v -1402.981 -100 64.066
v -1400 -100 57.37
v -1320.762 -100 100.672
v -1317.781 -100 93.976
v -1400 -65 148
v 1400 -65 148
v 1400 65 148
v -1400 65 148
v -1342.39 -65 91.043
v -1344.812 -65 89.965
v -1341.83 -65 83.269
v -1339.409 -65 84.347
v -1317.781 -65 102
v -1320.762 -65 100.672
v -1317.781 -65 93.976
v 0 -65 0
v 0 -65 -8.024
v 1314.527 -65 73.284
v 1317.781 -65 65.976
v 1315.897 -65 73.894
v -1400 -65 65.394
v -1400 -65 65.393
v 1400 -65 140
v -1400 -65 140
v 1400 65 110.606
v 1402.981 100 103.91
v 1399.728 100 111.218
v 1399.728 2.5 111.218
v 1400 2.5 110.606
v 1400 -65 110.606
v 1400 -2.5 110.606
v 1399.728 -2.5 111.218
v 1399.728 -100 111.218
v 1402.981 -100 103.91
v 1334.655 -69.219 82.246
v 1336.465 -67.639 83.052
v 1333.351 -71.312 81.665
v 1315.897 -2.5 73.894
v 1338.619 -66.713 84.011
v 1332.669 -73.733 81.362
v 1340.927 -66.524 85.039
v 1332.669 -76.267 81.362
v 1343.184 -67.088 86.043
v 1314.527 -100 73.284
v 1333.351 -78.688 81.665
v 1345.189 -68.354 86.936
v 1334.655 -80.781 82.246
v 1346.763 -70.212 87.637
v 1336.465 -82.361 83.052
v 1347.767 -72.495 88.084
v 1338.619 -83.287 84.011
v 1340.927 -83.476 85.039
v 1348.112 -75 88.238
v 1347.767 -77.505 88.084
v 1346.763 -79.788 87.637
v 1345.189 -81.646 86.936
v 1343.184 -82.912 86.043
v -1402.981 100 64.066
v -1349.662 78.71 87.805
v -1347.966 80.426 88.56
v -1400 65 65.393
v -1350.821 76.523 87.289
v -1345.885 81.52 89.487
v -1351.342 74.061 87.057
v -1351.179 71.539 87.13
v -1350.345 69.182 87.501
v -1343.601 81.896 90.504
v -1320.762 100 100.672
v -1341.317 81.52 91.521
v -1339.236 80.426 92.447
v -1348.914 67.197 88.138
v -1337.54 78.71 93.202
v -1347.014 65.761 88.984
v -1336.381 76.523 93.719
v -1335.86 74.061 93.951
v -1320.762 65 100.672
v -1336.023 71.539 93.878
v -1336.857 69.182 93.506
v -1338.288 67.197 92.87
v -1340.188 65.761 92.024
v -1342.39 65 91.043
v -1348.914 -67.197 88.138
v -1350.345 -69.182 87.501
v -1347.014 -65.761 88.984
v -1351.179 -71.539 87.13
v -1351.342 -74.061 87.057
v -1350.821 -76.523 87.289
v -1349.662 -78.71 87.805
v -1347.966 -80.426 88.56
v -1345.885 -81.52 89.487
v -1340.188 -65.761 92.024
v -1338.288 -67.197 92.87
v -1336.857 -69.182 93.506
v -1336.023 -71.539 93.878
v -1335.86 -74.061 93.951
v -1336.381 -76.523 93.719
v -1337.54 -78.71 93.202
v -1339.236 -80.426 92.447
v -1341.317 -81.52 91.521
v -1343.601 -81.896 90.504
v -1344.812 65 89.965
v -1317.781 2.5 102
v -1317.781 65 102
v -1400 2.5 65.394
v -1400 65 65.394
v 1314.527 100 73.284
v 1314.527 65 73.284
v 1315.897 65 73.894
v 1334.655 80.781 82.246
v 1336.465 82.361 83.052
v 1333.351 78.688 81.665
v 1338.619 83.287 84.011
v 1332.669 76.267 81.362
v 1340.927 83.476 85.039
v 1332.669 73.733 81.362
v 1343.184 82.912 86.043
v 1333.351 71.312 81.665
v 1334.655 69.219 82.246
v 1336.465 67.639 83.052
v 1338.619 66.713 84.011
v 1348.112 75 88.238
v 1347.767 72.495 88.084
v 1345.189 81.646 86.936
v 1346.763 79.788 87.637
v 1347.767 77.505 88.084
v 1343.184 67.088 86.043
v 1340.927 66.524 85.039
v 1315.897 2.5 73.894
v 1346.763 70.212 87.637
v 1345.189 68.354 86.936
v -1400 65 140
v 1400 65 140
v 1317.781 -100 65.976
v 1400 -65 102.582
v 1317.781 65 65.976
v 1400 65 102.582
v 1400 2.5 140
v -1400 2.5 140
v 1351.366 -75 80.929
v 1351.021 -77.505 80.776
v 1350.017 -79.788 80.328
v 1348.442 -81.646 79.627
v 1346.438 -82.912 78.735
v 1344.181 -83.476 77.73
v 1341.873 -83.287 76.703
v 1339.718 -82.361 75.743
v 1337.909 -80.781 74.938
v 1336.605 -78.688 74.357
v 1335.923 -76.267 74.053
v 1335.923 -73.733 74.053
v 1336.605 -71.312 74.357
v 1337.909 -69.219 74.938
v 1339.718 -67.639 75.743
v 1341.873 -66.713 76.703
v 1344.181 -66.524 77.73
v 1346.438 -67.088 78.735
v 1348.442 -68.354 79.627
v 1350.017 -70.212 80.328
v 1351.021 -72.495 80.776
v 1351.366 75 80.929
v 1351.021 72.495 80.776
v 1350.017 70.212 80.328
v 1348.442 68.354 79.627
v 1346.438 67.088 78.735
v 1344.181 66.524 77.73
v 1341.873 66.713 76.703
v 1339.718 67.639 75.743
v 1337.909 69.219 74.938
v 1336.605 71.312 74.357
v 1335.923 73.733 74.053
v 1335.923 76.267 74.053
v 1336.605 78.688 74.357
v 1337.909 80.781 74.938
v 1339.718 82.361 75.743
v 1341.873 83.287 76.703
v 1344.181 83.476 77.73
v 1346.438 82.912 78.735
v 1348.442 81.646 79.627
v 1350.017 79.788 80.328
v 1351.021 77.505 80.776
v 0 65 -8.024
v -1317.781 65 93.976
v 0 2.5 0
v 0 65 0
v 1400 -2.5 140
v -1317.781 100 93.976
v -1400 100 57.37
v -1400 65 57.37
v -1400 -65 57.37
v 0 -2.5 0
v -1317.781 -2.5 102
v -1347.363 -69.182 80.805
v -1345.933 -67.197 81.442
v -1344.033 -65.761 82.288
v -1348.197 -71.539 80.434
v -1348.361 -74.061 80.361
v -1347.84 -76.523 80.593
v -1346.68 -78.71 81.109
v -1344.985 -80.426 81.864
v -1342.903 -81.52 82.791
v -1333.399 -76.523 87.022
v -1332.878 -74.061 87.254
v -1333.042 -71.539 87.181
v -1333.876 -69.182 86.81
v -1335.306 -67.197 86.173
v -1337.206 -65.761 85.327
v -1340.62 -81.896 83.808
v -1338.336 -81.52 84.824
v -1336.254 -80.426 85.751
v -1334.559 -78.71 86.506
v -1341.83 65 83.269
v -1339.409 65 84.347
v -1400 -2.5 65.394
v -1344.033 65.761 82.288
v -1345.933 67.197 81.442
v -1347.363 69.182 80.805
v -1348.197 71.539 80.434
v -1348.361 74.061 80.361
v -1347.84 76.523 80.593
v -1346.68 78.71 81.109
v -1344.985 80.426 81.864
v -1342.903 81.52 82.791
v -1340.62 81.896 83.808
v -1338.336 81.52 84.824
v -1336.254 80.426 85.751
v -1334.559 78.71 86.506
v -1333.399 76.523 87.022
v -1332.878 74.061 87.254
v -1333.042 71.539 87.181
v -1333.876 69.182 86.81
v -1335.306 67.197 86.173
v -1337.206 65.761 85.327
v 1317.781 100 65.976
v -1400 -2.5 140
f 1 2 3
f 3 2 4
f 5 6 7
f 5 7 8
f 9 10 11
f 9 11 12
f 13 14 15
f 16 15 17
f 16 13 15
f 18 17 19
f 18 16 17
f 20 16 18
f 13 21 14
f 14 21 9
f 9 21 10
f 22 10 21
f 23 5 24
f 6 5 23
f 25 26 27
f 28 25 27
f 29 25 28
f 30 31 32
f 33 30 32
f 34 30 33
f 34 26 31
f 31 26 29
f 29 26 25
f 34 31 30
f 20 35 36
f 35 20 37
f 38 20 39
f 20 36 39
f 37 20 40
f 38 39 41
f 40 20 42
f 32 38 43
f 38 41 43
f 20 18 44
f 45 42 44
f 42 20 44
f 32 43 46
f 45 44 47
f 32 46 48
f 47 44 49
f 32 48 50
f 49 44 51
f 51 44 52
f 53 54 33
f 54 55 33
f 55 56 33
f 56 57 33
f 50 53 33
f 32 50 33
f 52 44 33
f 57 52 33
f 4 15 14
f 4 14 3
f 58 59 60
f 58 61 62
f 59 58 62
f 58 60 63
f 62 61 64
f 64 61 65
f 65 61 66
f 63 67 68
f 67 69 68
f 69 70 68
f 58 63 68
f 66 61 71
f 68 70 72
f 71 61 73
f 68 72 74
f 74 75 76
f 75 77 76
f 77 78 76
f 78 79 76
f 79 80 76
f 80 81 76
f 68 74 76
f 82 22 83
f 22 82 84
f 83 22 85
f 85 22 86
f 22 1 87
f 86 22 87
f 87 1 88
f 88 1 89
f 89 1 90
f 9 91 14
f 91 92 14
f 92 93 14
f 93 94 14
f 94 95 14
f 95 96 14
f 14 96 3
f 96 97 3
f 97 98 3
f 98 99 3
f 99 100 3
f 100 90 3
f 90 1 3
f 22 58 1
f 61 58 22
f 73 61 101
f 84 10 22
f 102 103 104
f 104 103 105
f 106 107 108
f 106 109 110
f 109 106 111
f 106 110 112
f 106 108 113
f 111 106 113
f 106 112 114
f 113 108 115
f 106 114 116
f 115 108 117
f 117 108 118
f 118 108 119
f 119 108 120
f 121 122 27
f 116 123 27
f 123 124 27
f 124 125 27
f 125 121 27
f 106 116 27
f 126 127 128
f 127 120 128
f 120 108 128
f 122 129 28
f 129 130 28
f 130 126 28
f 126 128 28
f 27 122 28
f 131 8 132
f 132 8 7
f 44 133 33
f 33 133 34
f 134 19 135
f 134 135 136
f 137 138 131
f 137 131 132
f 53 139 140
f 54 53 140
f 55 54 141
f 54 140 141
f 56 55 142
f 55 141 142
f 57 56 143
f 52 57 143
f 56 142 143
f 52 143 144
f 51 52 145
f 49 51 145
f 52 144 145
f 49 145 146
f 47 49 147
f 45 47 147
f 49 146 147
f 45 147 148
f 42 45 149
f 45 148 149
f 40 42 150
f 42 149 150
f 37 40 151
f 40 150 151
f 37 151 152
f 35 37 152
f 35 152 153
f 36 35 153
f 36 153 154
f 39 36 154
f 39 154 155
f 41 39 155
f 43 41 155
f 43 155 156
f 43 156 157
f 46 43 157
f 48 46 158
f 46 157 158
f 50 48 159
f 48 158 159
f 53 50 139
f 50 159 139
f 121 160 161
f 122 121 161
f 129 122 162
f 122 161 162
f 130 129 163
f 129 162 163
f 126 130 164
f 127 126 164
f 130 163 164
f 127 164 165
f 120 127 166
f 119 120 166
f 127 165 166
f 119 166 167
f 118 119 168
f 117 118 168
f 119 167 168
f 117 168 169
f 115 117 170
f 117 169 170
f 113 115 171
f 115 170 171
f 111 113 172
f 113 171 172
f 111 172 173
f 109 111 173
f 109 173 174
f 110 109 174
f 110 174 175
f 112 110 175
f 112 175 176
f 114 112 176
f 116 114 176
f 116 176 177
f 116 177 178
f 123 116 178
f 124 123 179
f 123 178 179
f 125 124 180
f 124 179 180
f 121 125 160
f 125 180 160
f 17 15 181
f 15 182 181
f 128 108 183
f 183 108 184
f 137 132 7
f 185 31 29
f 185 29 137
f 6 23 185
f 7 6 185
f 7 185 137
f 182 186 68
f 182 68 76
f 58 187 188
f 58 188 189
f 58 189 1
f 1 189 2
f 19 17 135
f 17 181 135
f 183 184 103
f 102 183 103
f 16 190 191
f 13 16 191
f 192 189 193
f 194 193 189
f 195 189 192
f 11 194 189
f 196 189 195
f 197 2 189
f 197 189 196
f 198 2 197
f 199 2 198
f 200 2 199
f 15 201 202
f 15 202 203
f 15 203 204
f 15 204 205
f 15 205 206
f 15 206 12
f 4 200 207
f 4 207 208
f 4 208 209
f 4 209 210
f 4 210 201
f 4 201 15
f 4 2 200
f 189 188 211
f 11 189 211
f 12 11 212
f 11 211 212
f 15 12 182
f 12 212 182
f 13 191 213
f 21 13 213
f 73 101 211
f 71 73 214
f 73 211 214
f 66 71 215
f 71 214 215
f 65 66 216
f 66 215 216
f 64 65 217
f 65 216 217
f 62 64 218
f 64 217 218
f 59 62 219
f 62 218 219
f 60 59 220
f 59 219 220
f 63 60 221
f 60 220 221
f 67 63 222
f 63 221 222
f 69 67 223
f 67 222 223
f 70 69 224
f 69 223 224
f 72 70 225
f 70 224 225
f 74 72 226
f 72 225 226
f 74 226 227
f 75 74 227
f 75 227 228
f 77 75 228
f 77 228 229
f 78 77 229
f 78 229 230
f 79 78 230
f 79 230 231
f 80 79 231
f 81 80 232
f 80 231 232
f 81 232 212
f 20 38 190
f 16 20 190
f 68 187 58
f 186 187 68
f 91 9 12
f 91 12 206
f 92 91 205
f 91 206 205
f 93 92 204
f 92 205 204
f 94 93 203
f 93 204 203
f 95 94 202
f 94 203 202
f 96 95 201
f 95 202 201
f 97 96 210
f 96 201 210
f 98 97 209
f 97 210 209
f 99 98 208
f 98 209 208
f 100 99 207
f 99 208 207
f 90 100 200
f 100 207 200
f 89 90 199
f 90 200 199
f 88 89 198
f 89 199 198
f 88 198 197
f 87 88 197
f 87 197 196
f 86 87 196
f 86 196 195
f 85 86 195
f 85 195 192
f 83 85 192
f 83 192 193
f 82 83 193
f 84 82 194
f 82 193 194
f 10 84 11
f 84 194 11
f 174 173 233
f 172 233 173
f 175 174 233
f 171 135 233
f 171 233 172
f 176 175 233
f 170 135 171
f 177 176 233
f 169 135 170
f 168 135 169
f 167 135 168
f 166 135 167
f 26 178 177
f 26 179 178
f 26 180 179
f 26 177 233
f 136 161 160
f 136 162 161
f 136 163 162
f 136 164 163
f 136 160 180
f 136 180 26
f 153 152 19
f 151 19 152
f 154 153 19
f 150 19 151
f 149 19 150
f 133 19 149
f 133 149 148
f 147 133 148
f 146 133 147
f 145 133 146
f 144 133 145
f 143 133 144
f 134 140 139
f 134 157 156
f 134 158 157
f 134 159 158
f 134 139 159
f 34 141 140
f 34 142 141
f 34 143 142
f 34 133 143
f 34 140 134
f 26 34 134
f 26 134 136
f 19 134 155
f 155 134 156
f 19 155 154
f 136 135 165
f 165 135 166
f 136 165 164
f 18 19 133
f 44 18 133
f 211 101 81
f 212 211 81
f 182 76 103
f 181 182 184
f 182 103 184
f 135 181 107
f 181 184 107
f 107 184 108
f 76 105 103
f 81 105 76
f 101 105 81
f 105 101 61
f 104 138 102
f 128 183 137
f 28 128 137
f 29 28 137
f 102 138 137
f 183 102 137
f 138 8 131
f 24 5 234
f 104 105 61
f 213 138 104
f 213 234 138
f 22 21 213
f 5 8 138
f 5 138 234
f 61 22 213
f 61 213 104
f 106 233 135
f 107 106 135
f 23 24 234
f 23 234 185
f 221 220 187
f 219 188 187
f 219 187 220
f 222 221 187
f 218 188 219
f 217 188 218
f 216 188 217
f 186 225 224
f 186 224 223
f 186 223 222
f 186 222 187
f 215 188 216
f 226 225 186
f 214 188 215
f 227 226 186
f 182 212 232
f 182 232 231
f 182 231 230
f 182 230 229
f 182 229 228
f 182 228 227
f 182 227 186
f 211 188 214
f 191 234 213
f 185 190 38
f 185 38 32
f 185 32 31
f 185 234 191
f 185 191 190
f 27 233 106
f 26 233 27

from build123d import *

# Parameters (mm, degrees)
F1_DEPTH = 2.5
F3_DEPTH = 65
F5_W     = 93.2636259532
F5_H     = 200
F5_R     = 8.5
F6_DEPTH = 8
F7_W     = 90
F7_H     = 200
F7_R     = 8.5
F8_DEPTH = 7.33


with BuildPart() as f1:
    # F0 (on Front) → F1 (new body, symmetric)
    with BuildSketch(Plane.XZ):
        Polygon((1400, 140), (0, 140), (-1400, 140), (-1400, 65.3937021232), (-1317.7809088122, 102), (0, 0), (1317.7809088122, 74), (1400, 110.6062978768), align=None)
    extrude(amount=F1_DEPTH, both=True)

    # F2 (on Front) → F3 (join, symmetric)
    with BuildSketch(Plane.XZ):
        Polygon((1317.7809088122, 74), (0, 0), (-1317.7809088122, 102), (-1400, 65.3937021232), (-1400, 57.3697731049), (-1317.7809088122, 93.9760709817), (0, -8.0239290183), (1317.7809088122, 65.9760709817), (1400, 102.5823688585), (1400, 110.6062978768), align=None)
        Polygon((-1400, 140), (0, 140), (1400, 140), (1400, 148), (0, 148), (-1400, 148), align=None)
    extrude(amount=F3_DEPTH, both=True)

    # F5 (on face) → F6 (join)
    with BuildSketch(Plane(origin=(193.4917972476, 0, -434.5896920669), x_dir=(0.9135454576, 0, 0.4067366431), z_dir=(0.4067366431, 0, -0.9135454576))):
        with Locations((1277.3194620245, 0)):
            Rectangle(F5_W, F5_H)
        with Locations((1258.9512750011, -75)):
            Circle(F5_R, mode=Mode.SUBTRACT)
        with Locations((1258.9512750011, 75)):
            Circle(F5_R, mode=Mode.SUBTRACT)
    extrude(amount=-F6_DEPTH)

    # F7 (on face) → F8 (join)
    with BuildSketch(Plane(origin=(-252.9256005596, 0, 568.0801999188), x_dir=(0.9135454576, 0, 0.4067366431), z_dir=(0.4067366431, 0, -0.9135454576))):
        with Locations((-1210.6292517729, 0)):
            Rectangle(F7_W, F7_H)
        with Locations((-1190.6292517729, -73.3960138768)):
            Circle(F7_R, mode=Mode.SUBTRACT)
        with Locations((-1190.6292517729, 73.3960138768)):
            Circle(F7_R, mode=Mode.SUBTRACT)
    extrude(amount=-F8_DEPTH)


solid = f1.part
